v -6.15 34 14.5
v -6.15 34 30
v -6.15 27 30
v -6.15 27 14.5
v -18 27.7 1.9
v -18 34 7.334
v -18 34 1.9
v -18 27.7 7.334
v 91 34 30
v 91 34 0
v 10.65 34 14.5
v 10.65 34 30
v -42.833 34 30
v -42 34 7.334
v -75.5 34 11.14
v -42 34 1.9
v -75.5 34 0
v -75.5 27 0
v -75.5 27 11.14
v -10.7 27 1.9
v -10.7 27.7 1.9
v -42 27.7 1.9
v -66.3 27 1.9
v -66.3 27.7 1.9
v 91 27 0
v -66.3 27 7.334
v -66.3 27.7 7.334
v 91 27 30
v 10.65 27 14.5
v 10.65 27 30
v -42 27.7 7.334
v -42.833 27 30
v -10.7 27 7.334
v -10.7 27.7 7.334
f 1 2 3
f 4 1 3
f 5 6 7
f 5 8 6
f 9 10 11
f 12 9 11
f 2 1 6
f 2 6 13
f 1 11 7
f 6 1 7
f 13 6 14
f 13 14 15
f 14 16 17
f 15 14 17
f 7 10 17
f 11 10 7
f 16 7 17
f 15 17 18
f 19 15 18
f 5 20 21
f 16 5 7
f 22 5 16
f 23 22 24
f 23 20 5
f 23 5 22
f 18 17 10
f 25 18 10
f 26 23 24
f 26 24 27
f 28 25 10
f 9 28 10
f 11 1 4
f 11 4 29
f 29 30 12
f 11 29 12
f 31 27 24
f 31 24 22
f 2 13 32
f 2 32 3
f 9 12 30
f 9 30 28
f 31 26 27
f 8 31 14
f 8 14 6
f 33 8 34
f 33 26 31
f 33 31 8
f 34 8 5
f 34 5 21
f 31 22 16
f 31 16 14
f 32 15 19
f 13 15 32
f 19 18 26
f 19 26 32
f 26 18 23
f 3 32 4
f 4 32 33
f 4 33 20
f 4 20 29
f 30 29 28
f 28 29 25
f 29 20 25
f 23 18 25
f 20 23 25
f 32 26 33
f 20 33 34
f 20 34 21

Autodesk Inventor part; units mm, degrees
ref_plane "YZ Plane" through (0, 0, 0) normal (1, 0, 0) x (0, 1, 0)
ref_plane "XZ Plane" through (0, 0, 0) normal (0, 1, 0) x (-1, 0, 0)
ref_plane "XY Plane" through (0, 0, 0) normal (0, 0, 1) x (1, 0, 0)
sketch "Sketch1" plane through (0, 0, 0) normal (0, 0, 1) x (1, 0, 0)
  line L0 (91, -34) -> (91, 34)
  line L1 (91, 34) -> (41, 34)
  line L2 (41, 34) -> (41, 89)
  line L3 (41, 89) -> (-91, 89)
  line L4 (-91, 89) -> (-91, -89)
  line L5 (-91, -89) -> (41, -89)
  line L6 (41, -89) -> (41, -34)
  line L7 (41, -34) -> (91, -34)
  line L8 (70, 27) -> (62, 27)
  line L9 (91, 34) -> (-87, 34)
  line L10 (-87, 34) -> (-87, 27)
  line L11 (-87, 27) -> (91, 27)
  line L12 (91, 27) -> (91, 34)
  circle A0 centre (-83, 21.5) radius 1.2295
  circle A1 centre (-83, -64.5) radius 1.2295
  circle A2 centre (-83, -21.5) radius 1.2295
  circle A3 centre (-83, 64.5) radius 1.2295
  line L13 (-85, -72) -> (-76, -72)
  line L14 (-76, -72) -> (-76, -57)
  line L15 (-76, -57) -> (-85, -57)
  arc A4 (-87, -55) -> (-85, -57) centre (-85, -55) ccw
  line L16 (-87, -55) -> (-87, -31)
  arc A5 (-85, -29) -> (-87, -31) centre (-85, -31) ccw
  line L17 (-85, -29) -> (-76, -29)
  line L18 (-76, -29) -> (-76, -14)
  line L19 (-76, -14) -> (-85, -14)
  arc A6 (-87, -12) -> (-85, -14) centre (-85, -12) ccw
  line L20 (-87, -12) -> (-87, 12)
  arc A7 (-85, 14) -> (-87, 12) centre (-85, 12) ccw
  line L21 (-85, 14) -> (-76, 14)
  line L22 (-76, 14) -> (-76, 29)
  line L23 (-76, 29) -> (-85, 29)
  arc A8 (-87, 31) -> (-85, 29) centre (-85, 31) ccw
  line L24 (-87, 31) -> (-87, 55)
  arc A9 (-85, 57) -> (-87, 55) centre (-85, 55) ccw
  line L25 (-85, 57) -> (-76, 57)
  line L26 (-76, 57) -> (-76, 72)
  line L27 (-76, 72) -> (-85, 72)
  arc A10 (-87, 74) -> (-85, 72) centre (-85, 74) ccw
  line L28 (-87, 74) -> (-87, 89)
  line L29 (-91, 89) -> (-87, 89)
  line L30 (-91, -89) -> (-91, 89)
  line L31 (-91, -89) -> (-87, -89)
  line L32 (-87, -89) -> (-87, -74)
  arc A11 (-85, -72) -> (-87, -74) centre (-85, -74) ccw
  line L33 (-91, 89.5) -> (-86.5, 89.5)
  line L34 (-86.5, 89.5) -> (-86.5, 74)
  arc A12 (-86.5, 74) -> (-85, 72.5) centre (-85, 74) ccw
  line L35 (-85, 72.5) -> (-75.5, 72.5)
  line L36 (-75.5, 72.5) -> (-75.5, 56.5)
  line L37 (-75.5, 56.5) -> (-85, 56.5)
  arc A13 (-85, 56.5) -> (-86.5, 55) centre (-85, 55) ccw
  line L38 (-86.5, 55) -> (-86.5, 31)
  arc A14 (-86.5, 31) -> (-85, 29.5) centre (-85, 31) ccw
  line L39 (-85, 29.5) -> (-75.5, 29.5)
  line L40 (-75.5, 29.5) -> (-75.5, 13.5)
  line L41 (-75.5, 13.5) -> (-85, 13.5)
  arc A15 (-85, 13.5) -> (-86.5, 12) centre (-85, 12) ccw
  line L42 (-86.5, 12) -> (-86.5, -12)
  arc A16 (-86.5, -12) -> (-85, -13.5) centre (-85, -12) ccw
  line L43 (-85, -13.5) -> (-75.5, -13.5)
  line L44 (-75.5, -13.5) -> (-75.5, -29.5)
  line L45 (-75.5, -29.5) -> (-85, -29.5)
  arc A17 (-85, -29.5) -> (-86.5, -31) centre (-85, -31) ccw
  line L46 (-86.5, -31) -> (-86.5, -55)
  arc A18 (-86.5, -55) -> (-85, -56.5) centre (-85, -55) ccw
  line L47 (-85, -56.5) -> (-75.5, -56.5)
  line L48 (-75.5, -56.5) -> (-75.5, -72.5)
  line L49 (-75.5, -72.5) -> (-85, -72.5)
  arc A19 (-85, -72.5) -> (-86.5, -74) centre (-85, -74) ccw
  line L50 (-86.5, -74) -> (-86.5, -89.5)
  line L51 (-86.5, -89.5) -> (-91, -89.5)
  line L52 (-86.5, 31) -> (-75.5, 31)
  line L53 (-75.5, 31) -> (-75.5, 29.5)
  line L54 (-75.5, 31) -> (-75.5, 34)
  point P0 (0, 0)
  point P1 (-75.5, 27)
  point P2 (-86.5, 34)
  dimension "d6" = 0.5
extrude "Extrusion1" add sketch "Sketch1" along normal blind 30 contours L11 L8 L40 L53 L54 L9 L1 L0
sketch "Sketch3" plane through (-86.5, 34, 0) normal (0, 1, 0) x (1, 0, 0)
  line L0 (-0.5, -4.5) -> (-0.5, 0)
  line L1 (-0.5, 0) -> (-4.5, 0)
  line L2 (-4.5, 0) -> (-4.5, 3.5)
  line L3 (-4.5, 3.5) -> (-18.5, 3.5)
  line L4 (-18.5, 3.5) -> (-4.5, -5.5)
  line L5 (-4.5, -5.5) -> (-4.5, -4.5)
  line L6 (-4.5, -4.5) -> (-0.5, -4.5)
  line L7 (-0.5, -4.5) -> (50.0525, -33.6865)
  line L8 (177.5, 0) -> (11, 0)
  line L9 (177.5, -30) -> (11, -30)
  line L10 (177.5, 0) -> (177.5, -30)
  line L11 (11, 0) -> (11, -30)
  point P0 (86.5, 0)
  point P1 (43.6673, -30)
  point P2 (11, -11.1395)
  dimension "d7" = 30
extrude "Extrusion4" cut sketch "Sketch3" against normal blind 30 contours L7 L9 L11
sketch "Sketch5" plane through (-75.5, 27, 0) normal (0, -1, 0) x (1, 0, 0)
  line L0 (56.5, 7.0341) -> (57.5, 7.0341)
  line L1 (34.5, 7.0341) -> (56.5, 7.0341)
  line L2 (33.5, 7.0341) -> (33.5, 6.6226)
  line L3 (33.5, 6.6226) -> (9.5, 6.6226)
  line L4 (9.5, 6.6226) -> (9.5, 7.0341)
  line L5 (9.5, 7.0341) -> (33.5, 7.0341)
  line L6 (64.5, 7.0341) -> (64.5, 6.6226)
  line L7 (64.5, 6.6226) -> (57.5, 6.6226)
  line L8 (57.5, 6.6226) -> (57.5, 7.0341)
  line L9 (57.5, 7.0341) -> (64.5, 7.0341)
  line L10 (9.5, 2) -> (9.5, 2.6226)
  line L11 (9.5, 2.6226) -> (64.5, 2.6226)
  line L12 (64.5, 2.6226) -> (64.5, 2)
  line L13 (64.5, 2) -> (9.5, 2)
  line L14 (9.5, 7.0341) -> (64.5, 7.0341)
  line L15 (64.5, 7.0341) -> (64.5, 2)
  line L16 (64.5, 2) -> (9.5, 2)
  line L17 (9.5, 2) -> (9.5, 7.0341)
  line L18 (9.2, 7.3341) -> (64.8, 7.3341)
  line L19 (64.8, 7.3341) -> (64.8, 1.9)
  line L20 (64.8, 1.9) -> (9.2, 1.9)
  line L21 (9.2, 1.9) -> (9.2, 7.3341)
  point P0 (75.5, 0)
  dimension "d19" = 0.3
  dimension "d20" = 0.3
  dimension "d21" = 0.1
  dimension "d22" = 0.3
extrude "Extrusion6" cut sketch "Sketch5" against normal blind 0.7 contours L0 L8 L7 L15 L11 L17 L3 L2 L14 L1 | L9 L6 L7 L8 | L2 L3 L4 L5 | L12 L13 L10 L11 | L18 L19 L20 L21
sketch "Sketch6" plane through (-75.5, 27, 0) normal (0, -1, 0) x (1, 0, 0)
  line L0 (33.5, 7.0341) -> (34.5, 7.0341)
  line L1 (34.5, 7.0341) -> (56.5, 7.0341)
  line L2 (56.5, 7.0341) -> (57.5, 7.0341)
  line L3 (64.8, 1.9) -> (9.2, 1.9)
  line L4 (64.8, 7.3341) -> (64.8, 1.9)
  line L5 (9.2, 7.3341) -> (64.8, 7.3341)
  line L6 (9.2, 1.9) -> (9.2, 7.3341)
  line L7 (33.5, 7.3341) -> (57.5, 7.3341)
  line L8 (57.5, 7.3341) -> (57.5, 1.9)
  line L9 (57.5, 1.9) -> (33.5, 1.9)
  line L10 (33.5, 1.9) -> (33.5, 7.3341)
  point P0 (75.5, 0)
extrude "Extrusion7" cut sketch "Sketch6" against normal up to next contours L10 L5 L8 L2 L1 L0 | L0 L1 L2 L8 L3 L10
sketch "Sketch7" plane through (0, 0, 30) normal (0, 0, 1) x (1, 0, 0)
  line L0 (10.25, -34) -> (10.25, 34)
  line L1 (10.25, 34) -> (-5.75, 34)
  line L2 (-5.75, -34) -> (-5.75, 34)
  line L3 (10.25, -34) -> (-5.75, -34)
  line L4 (-42.8327, 27) -> (91, 27)
  line L5 (10.25, 34) -> (-5.75, 34)
  line L6 (-5.75, 34) -> (-5.75, 27)
  line L7 (-5.75, 27) -> (10.25, 27)
  line L8 (10.25, 27) -> (10.25, 34)
  line L9 (10.65, 34) -> (-6.15, 34)
  line L10 (-6.15, 34) -> (-6.15, 27)
  line L11 (-6.15, 27) -> (10.65, 27)
  line L12 (10.65, 27) -> (10.65, 34)
  point P0 (0, 0)
  dimension "d27" = 0.4
  dimension "d28" = 0.4
extrude "Extrusion8" cut sketch "Sketch7" against normal blind 15.5 contours L4 L2 L1 L0 | L0 L9 L12 L4 | L4 L10 L9 L2
properties part number "right_hold"
